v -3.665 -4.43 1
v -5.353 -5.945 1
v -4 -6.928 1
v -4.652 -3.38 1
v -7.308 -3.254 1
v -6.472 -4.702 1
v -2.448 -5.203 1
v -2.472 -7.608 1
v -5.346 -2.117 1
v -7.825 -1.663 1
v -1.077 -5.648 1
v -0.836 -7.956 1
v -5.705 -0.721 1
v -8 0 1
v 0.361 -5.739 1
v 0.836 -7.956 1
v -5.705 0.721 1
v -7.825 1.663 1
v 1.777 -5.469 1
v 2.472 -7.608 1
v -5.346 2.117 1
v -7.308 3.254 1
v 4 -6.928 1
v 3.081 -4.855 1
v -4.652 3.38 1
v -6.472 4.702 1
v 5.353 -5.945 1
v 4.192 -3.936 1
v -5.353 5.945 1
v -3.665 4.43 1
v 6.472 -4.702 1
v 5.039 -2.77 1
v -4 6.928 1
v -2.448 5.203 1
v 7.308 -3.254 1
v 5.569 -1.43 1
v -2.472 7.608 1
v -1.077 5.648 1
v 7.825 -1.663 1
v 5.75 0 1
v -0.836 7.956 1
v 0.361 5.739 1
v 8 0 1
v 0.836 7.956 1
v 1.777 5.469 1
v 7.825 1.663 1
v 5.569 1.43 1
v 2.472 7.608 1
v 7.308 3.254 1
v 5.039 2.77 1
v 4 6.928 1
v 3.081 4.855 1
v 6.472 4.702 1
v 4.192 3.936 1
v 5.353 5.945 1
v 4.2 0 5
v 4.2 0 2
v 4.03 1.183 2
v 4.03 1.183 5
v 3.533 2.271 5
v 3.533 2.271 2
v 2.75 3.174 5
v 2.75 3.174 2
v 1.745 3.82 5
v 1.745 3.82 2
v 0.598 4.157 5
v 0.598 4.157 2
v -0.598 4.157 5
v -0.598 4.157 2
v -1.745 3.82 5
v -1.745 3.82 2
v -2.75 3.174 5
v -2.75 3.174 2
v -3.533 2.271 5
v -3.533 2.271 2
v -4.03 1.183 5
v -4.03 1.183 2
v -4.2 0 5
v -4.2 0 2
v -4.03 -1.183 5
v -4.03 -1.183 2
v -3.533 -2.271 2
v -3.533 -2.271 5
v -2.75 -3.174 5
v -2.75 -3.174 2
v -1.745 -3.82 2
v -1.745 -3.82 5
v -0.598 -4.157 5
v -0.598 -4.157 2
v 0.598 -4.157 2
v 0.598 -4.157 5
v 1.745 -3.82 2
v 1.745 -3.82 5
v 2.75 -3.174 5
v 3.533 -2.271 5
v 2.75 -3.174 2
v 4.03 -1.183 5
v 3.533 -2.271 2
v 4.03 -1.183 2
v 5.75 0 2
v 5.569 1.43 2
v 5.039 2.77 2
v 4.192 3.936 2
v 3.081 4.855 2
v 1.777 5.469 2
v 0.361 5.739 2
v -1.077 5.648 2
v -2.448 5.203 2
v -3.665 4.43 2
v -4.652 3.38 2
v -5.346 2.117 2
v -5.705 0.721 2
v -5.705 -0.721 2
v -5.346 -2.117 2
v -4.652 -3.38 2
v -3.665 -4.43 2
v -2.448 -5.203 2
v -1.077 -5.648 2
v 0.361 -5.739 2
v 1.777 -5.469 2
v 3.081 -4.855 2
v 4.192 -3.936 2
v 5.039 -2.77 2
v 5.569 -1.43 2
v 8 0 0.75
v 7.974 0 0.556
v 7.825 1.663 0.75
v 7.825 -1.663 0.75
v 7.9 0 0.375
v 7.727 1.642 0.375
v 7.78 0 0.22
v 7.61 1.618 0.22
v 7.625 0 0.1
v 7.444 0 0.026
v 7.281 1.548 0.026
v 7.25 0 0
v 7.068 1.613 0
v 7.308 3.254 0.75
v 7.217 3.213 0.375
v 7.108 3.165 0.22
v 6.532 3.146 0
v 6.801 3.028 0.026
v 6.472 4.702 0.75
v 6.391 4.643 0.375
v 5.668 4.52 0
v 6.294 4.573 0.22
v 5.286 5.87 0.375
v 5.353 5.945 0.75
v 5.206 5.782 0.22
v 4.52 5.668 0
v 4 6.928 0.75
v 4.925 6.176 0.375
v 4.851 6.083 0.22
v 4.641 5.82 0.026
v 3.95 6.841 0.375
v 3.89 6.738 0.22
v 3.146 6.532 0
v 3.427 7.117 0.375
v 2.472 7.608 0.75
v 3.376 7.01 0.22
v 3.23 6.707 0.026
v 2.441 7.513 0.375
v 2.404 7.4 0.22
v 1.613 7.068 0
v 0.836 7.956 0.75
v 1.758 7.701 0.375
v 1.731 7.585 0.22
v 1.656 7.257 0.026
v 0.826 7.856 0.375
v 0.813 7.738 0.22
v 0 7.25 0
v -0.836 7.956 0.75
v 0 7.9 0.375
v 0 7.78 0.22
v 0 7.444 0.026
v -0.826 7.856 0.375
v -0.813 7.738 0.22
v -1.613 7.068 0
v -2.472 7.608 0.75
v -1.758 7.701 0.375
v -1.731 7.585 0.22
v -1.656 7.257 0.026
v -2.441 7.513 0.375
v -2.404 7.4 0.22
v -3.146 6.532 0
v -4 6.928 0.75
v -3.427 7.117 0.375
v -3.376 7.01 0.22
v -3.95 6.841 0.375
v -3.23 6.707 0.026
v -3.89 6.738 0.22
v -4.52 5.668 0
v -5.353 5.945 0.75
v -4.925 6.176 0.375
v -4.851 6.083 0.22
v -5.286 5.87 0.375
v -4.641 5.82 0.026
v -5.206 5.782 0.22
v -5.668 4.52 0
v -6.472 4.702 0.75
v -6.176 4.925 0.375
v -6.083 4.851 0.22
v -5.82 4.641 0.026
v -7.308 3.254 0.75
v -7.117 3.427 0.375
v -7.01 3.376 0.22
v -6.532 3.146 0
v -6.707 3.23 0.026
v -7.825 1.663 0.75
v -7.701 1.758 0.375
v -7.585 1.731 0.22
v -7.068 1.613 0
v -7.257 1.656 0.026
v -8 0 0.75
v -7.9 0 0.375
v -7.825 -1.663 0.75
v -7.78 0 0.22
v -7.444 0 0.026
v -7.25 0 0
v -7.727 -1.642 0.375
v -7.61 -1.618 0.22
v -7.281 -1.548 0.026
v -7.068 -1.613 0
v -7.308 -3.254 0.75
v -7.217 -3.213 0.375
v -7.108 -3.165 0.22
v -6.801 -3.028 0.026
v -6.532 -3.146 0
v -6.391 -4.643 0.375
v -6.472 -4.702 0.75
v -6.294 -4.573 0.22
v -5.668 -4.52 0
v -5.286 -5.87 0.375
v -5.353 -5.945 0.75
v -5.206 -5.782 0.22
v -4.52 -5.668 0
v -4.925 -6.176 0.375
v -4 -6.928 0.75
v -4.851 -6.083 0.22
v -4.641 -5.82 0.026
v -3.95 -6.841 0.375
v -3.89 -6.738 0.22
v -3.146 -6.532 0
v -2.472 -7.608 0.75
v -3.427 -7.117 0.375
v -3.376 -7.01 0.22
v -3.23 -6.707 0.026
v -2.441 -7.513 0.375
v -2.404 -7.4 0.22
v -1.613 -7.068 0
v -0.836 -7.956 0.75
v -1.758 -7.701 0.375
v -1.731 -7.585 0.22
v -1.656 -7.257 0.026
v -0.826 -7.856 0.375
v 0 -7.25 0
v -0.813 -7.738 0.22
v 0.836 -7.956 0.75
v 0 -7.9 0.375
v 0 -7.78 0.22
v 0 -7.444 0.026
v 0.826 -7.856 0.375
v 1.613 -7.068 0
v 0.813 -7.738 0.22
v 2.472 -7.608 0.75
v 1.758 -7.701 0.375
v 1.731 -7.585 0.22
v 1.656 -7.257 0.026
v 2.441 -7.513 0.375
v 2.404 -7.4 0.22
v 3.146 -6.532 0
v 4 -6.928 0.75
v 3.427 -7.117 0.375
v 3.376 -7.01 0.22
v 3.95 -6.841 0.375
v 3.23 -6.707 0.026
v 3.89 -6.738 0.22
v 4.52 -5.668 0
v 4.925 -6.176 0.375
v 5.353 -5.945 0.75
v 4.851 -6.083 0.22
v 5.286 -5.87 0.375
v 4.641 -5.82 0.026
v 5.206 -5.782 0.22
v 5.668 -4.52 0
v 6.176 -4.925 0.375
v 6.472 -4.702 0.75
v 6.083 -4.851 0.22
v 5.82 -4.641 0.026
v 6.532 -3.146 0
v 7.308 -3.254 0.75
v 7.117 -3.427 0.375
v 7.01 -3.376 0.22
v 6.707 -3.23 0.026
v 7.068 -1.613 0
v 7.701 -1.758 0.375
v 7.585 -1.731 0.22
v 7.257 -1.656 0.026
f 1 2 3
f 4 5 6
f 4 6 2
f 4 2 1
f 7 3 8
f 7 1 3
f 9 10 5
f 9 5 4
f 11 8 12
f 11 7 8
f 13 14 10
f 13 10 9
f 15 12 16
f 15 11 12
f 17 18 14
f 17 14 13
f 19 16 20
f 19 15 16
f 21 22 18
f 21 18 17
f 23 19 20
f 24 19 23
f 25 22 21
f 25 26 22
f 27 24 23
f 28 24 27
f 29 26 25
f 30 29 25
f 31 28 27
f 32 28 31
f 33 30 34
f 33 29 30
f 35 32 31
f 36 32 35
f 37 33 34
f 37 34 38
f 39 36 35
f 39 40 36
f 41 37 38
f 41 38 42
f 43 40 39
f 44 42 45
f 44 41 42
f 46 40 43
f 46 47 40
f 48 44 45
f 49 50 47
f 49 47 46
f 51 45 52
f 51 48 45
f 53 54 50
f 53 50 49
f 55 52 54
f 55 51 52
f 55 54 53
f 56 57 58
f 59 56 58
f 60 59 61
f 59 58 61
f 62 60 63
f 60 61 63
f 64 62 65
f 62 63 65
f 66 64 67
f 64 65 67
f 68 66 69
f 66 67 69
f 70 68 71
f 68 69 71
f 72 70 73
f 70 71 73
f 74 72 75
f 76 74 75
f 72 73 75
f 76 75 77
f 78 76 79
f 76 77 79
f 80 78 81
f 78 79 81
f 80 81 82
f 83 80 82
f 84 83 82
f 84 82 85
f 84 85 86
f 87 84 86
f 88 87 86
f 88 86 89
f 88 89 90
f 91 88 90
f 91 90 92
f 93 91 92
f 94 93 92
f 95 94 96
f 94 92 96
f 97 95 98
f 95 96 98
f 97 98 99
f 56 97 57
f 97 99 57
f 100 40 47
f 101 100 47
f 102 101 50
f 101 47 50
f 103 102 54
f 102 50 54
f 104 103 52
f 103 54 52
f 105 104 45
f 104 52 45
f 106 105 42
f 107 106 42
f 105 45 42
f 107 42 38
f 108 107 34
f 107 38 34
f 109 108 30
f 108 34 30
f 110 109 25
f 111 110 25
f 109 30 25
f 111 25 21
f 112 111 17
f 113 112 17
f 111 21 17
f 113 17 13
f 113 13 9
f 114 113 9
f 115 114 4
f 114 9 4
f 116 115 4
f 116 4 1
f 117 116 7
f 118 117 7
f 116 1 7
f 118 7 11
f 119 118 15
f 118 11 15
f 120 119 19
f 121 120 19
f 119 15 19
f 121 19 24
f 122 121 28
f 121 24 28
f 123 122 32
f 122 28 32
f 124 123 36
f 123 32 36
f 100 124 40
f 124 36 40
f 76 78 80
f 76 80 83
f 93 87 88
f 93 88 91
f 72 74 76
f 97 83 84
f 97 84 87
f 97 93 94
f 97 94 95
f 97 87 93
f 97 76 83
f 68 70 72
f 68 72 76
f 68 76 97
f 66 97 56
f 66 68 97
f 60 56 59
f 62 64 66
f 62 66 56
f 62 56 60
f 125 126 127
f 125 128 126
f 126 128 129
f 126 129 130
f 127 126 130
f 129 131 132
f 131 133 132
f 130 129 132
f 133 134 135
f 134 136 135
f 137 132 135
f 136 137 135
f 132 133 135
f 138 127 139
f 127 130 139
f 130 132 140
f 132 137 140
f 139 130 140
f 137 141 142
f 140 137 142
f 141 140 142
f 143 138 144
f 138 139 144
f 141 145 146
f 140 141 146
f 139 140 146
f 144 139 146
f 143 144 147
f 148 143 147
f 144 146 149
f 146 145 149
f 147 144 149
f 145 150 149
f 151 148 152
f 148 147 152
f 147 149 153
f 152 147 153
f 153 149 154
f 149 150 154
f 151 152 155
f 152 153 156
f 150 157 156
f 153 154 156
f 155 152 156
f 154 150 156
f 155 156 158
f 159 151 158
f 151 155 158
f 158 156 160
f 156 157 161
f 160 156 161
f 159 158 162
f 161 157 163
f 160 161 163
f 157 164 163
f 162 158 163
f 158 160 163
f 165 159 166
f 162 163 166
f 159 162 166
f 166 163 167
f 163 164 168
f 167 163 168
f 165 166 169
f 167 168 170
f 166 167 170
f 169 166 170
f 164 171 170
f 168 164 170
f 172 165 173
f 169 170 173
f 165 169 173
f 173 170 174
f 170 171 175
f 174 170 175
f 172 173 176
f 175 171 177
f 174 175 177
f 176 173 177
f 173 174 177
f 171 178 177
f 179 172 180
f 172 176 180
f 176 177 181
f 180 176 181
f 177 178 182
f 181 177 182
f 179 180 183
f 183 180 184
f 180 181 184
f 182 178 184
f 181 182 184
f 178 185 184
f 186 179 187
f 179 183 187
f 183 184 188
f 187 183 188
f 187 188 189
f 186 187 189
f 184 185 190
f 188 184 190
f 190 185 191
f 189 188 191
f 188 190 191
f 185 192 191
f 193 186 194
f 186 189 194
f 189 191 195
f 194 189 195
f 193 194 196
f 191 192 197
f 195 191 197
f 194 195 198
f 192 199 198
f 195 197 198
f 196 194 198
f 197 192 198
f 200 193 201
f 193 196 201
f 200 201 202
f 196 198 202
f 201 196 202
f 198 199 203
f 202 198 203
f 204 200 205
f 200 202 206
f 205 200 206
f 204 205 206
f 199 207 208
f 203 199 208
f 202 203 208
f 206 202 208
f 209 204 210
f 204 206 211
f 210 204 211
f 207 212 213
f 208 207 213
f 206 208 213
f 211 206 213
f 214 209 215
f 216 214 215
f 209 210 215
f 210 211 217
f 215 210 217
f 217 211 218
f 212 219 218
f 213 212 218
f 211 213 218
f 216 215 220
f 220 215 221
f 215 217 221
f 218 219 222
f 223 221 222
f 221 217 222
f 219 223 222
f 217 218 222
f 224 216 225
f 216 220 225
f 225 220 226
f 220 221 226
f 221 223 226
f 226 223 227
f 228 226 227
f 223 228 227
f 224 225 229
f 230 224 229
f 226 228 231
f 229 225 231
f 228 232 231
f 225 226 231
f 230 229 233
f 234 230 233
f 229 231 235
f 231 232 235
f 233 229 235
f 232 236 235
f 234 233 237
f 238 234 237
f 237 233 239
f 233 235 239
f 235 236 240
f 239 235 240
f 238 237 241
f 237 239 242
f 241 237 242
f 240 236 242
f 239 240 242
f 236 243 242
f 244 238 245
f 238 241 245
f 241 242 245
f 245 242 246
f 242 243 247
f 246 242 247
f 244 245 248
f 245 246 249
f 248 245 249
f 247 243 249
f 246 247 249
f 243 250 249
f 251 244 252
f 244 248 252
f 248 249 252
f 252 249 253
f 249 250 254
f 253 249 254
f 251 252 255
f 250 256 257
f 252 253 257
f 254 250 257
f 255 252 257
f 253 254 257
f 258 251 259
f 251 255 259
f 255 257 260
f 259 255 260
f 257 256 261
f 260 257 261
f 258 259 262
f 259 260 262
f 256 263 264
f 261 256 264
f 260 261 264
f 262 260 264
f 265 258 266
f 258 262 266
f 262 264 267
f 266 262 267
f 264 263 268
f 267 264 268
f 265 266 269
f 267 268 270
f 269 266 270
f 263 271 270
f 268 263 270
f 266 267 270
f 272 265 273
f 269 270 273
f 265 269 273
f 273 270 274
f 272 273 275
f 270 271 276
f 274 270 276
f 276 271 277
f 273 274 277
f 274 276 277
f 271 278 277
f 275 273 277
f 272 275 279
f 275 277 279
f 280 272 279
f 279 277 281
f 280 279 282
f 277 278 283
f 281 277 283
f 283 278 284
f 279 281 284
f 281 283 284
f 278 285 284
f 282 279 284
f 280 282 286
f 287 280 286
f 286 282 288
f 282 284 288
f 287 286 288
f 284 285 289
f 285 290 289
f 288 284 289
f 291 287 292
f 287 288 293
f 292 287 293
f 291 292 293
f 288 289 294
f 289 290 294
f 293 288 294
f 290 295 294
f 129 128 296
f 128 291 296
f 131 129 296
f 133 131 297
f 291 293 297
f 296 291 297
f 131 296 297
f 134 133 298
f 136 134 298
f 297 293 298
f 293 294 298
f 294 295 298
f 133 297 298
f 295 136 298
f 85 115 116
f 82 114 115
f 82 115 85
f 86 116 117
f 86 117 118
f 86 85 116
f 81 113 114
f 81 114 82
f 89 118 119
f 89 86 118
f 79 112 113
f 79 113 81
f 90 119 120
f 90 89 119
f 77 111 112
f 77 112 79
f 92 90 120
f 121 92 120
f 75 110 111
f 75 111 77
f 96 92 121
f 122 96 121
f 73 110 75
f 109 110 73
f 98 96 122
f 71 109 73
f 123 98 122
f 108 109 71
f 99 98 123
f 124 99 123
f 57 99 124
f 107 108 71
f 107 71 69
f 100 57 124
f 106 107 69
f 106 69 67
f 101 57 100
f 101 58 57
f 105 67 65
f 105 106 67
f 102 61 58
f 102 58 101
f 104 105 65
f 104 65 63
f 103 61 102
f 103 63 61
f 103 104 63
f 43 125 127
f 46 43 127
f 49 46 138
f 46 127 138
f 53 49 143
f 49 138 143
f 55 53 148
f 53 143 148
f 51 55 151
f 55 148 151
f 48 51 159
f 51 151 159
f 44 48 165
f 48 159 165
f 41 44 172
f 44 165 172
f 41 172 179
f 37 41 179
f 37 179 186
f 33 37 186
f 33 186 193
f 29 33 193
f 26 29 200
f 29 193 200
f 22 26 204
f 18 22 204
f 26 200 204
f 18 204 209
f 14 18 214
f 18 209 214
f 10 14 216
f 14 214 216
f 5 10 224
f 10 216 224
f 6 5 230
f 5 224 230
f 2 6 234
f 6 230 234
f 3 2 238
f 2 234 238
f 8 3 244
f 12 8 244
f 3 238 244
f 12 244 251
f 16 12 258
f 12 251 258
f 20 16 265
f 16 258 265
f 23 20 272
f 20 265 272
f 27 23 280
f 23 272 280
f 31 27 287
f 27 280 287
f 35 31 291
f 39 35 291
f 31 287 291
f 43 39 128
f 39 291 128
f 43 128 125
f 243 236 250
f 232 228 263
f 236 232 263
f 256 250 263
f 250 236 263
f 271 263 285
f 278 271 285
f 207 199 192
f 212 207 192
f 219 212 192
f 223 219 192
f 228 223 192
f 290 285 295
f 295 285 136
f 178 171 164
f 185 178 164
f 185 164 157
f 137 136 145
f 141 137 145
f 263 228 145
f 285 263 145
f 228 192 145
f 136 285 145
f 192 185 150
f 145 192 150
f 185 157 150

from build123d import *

# Parameters (mm, degrees)
F0_R     = 8
F1_DEPTH = 1
F2_R     = 5.75
F3_DEPTH = 1
F4_R     = 4.2
F5_DEPTH = 3
F6_R     = 0.75


with BuildPart() as f1:
    # F0 (on Top) → F1 (new body)
    with BuildSketch(Plane.XY):
        Circle(F0_R)
    extrude(amount=F1_DEPTH)

    # F2 (on face) → F3 (join)
    with BuildSketch(Plane.XY.offset(1)):
        Circle(F2_R)
    extrude(amount=F3_DEPTH)

    # F4 (on face) → F5 (join)
    with BuildSketch(Plane.XY.offset(2)):
        Circle(F4_R)
    extrude(amount=F5_DEPTH)

    # F6
    f6_edges = [f1.edges().sort_by_distance(p)[0] for p in [
        (-8, 0, 0),
    ]]
    fillet(f6_edges, radius=F6_R)


solid = f1.part
